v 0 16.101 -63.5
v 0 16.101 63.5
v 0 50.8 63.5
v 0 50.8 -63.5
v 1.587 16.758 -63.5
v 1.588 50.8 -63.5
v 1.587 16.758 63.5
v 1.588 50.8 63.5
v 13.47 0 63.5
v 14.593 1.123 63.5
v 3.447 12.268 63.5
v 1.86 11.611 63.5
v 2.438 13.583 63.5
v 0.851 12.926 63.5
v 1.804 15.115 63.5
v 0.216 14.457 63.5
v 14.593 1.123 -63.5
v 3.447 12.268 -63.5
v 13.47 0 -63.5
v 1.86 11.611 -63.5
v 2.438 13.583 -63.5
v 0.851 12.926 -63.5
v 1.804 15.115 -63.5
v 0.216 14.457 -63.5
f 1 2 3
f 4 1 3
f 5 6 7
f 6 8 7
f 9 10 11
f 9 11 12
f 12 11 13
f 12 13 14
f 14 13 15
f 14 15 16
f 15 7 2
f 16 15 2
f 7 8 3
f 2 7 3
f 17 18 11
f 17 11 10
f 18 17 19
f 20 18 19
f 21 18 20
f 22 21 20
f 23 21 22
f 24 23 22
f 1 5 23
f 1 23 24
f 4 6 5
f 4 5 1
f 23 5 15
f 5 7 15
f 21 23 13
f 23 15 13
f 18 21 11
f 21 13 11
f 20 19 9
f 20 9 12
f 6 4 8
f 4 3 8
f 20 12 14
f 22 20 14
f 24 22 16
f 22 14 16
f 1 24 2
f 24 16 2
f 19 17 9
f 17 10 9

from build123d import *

# Parameters (mm, degrees)
BOSS_EXTRUDE1_DEPTH = 63.5


with BuildPart() as part:
    # Sketch1 → Boss-Extrude1 (new, symmetric)
    with BuildSketch(Plane.XY):
        with BuildLine():
            Line((0, 16.100640303), (0, 50.8))
            Line((0, 50.8), (1.5875, 50.8))
            Line((1.5875, 50.8), (1.5875, 16.758204333))
            ThreePointArc((1.5875, 16.758204333), (2.070864969, 14.328164537), (3.447371939, 12.268076272))
            Line((3.447371939, 12.268076272), (14.592916197, 1.122532015))
            Line((14.592916197, 1.122532015), (13.470384182, 0))
            Line((13.470384182, 0), (1.859871939, 11.610512242))
            ThreePointArc((1.859871939, 11.610512242), (0.483364969, 13.670600507), (0, 16.100640303))
        make_face()
    extrude(amount=BOSS_EXTRUDE1_DEPTH, both=True)


solid = part.part
